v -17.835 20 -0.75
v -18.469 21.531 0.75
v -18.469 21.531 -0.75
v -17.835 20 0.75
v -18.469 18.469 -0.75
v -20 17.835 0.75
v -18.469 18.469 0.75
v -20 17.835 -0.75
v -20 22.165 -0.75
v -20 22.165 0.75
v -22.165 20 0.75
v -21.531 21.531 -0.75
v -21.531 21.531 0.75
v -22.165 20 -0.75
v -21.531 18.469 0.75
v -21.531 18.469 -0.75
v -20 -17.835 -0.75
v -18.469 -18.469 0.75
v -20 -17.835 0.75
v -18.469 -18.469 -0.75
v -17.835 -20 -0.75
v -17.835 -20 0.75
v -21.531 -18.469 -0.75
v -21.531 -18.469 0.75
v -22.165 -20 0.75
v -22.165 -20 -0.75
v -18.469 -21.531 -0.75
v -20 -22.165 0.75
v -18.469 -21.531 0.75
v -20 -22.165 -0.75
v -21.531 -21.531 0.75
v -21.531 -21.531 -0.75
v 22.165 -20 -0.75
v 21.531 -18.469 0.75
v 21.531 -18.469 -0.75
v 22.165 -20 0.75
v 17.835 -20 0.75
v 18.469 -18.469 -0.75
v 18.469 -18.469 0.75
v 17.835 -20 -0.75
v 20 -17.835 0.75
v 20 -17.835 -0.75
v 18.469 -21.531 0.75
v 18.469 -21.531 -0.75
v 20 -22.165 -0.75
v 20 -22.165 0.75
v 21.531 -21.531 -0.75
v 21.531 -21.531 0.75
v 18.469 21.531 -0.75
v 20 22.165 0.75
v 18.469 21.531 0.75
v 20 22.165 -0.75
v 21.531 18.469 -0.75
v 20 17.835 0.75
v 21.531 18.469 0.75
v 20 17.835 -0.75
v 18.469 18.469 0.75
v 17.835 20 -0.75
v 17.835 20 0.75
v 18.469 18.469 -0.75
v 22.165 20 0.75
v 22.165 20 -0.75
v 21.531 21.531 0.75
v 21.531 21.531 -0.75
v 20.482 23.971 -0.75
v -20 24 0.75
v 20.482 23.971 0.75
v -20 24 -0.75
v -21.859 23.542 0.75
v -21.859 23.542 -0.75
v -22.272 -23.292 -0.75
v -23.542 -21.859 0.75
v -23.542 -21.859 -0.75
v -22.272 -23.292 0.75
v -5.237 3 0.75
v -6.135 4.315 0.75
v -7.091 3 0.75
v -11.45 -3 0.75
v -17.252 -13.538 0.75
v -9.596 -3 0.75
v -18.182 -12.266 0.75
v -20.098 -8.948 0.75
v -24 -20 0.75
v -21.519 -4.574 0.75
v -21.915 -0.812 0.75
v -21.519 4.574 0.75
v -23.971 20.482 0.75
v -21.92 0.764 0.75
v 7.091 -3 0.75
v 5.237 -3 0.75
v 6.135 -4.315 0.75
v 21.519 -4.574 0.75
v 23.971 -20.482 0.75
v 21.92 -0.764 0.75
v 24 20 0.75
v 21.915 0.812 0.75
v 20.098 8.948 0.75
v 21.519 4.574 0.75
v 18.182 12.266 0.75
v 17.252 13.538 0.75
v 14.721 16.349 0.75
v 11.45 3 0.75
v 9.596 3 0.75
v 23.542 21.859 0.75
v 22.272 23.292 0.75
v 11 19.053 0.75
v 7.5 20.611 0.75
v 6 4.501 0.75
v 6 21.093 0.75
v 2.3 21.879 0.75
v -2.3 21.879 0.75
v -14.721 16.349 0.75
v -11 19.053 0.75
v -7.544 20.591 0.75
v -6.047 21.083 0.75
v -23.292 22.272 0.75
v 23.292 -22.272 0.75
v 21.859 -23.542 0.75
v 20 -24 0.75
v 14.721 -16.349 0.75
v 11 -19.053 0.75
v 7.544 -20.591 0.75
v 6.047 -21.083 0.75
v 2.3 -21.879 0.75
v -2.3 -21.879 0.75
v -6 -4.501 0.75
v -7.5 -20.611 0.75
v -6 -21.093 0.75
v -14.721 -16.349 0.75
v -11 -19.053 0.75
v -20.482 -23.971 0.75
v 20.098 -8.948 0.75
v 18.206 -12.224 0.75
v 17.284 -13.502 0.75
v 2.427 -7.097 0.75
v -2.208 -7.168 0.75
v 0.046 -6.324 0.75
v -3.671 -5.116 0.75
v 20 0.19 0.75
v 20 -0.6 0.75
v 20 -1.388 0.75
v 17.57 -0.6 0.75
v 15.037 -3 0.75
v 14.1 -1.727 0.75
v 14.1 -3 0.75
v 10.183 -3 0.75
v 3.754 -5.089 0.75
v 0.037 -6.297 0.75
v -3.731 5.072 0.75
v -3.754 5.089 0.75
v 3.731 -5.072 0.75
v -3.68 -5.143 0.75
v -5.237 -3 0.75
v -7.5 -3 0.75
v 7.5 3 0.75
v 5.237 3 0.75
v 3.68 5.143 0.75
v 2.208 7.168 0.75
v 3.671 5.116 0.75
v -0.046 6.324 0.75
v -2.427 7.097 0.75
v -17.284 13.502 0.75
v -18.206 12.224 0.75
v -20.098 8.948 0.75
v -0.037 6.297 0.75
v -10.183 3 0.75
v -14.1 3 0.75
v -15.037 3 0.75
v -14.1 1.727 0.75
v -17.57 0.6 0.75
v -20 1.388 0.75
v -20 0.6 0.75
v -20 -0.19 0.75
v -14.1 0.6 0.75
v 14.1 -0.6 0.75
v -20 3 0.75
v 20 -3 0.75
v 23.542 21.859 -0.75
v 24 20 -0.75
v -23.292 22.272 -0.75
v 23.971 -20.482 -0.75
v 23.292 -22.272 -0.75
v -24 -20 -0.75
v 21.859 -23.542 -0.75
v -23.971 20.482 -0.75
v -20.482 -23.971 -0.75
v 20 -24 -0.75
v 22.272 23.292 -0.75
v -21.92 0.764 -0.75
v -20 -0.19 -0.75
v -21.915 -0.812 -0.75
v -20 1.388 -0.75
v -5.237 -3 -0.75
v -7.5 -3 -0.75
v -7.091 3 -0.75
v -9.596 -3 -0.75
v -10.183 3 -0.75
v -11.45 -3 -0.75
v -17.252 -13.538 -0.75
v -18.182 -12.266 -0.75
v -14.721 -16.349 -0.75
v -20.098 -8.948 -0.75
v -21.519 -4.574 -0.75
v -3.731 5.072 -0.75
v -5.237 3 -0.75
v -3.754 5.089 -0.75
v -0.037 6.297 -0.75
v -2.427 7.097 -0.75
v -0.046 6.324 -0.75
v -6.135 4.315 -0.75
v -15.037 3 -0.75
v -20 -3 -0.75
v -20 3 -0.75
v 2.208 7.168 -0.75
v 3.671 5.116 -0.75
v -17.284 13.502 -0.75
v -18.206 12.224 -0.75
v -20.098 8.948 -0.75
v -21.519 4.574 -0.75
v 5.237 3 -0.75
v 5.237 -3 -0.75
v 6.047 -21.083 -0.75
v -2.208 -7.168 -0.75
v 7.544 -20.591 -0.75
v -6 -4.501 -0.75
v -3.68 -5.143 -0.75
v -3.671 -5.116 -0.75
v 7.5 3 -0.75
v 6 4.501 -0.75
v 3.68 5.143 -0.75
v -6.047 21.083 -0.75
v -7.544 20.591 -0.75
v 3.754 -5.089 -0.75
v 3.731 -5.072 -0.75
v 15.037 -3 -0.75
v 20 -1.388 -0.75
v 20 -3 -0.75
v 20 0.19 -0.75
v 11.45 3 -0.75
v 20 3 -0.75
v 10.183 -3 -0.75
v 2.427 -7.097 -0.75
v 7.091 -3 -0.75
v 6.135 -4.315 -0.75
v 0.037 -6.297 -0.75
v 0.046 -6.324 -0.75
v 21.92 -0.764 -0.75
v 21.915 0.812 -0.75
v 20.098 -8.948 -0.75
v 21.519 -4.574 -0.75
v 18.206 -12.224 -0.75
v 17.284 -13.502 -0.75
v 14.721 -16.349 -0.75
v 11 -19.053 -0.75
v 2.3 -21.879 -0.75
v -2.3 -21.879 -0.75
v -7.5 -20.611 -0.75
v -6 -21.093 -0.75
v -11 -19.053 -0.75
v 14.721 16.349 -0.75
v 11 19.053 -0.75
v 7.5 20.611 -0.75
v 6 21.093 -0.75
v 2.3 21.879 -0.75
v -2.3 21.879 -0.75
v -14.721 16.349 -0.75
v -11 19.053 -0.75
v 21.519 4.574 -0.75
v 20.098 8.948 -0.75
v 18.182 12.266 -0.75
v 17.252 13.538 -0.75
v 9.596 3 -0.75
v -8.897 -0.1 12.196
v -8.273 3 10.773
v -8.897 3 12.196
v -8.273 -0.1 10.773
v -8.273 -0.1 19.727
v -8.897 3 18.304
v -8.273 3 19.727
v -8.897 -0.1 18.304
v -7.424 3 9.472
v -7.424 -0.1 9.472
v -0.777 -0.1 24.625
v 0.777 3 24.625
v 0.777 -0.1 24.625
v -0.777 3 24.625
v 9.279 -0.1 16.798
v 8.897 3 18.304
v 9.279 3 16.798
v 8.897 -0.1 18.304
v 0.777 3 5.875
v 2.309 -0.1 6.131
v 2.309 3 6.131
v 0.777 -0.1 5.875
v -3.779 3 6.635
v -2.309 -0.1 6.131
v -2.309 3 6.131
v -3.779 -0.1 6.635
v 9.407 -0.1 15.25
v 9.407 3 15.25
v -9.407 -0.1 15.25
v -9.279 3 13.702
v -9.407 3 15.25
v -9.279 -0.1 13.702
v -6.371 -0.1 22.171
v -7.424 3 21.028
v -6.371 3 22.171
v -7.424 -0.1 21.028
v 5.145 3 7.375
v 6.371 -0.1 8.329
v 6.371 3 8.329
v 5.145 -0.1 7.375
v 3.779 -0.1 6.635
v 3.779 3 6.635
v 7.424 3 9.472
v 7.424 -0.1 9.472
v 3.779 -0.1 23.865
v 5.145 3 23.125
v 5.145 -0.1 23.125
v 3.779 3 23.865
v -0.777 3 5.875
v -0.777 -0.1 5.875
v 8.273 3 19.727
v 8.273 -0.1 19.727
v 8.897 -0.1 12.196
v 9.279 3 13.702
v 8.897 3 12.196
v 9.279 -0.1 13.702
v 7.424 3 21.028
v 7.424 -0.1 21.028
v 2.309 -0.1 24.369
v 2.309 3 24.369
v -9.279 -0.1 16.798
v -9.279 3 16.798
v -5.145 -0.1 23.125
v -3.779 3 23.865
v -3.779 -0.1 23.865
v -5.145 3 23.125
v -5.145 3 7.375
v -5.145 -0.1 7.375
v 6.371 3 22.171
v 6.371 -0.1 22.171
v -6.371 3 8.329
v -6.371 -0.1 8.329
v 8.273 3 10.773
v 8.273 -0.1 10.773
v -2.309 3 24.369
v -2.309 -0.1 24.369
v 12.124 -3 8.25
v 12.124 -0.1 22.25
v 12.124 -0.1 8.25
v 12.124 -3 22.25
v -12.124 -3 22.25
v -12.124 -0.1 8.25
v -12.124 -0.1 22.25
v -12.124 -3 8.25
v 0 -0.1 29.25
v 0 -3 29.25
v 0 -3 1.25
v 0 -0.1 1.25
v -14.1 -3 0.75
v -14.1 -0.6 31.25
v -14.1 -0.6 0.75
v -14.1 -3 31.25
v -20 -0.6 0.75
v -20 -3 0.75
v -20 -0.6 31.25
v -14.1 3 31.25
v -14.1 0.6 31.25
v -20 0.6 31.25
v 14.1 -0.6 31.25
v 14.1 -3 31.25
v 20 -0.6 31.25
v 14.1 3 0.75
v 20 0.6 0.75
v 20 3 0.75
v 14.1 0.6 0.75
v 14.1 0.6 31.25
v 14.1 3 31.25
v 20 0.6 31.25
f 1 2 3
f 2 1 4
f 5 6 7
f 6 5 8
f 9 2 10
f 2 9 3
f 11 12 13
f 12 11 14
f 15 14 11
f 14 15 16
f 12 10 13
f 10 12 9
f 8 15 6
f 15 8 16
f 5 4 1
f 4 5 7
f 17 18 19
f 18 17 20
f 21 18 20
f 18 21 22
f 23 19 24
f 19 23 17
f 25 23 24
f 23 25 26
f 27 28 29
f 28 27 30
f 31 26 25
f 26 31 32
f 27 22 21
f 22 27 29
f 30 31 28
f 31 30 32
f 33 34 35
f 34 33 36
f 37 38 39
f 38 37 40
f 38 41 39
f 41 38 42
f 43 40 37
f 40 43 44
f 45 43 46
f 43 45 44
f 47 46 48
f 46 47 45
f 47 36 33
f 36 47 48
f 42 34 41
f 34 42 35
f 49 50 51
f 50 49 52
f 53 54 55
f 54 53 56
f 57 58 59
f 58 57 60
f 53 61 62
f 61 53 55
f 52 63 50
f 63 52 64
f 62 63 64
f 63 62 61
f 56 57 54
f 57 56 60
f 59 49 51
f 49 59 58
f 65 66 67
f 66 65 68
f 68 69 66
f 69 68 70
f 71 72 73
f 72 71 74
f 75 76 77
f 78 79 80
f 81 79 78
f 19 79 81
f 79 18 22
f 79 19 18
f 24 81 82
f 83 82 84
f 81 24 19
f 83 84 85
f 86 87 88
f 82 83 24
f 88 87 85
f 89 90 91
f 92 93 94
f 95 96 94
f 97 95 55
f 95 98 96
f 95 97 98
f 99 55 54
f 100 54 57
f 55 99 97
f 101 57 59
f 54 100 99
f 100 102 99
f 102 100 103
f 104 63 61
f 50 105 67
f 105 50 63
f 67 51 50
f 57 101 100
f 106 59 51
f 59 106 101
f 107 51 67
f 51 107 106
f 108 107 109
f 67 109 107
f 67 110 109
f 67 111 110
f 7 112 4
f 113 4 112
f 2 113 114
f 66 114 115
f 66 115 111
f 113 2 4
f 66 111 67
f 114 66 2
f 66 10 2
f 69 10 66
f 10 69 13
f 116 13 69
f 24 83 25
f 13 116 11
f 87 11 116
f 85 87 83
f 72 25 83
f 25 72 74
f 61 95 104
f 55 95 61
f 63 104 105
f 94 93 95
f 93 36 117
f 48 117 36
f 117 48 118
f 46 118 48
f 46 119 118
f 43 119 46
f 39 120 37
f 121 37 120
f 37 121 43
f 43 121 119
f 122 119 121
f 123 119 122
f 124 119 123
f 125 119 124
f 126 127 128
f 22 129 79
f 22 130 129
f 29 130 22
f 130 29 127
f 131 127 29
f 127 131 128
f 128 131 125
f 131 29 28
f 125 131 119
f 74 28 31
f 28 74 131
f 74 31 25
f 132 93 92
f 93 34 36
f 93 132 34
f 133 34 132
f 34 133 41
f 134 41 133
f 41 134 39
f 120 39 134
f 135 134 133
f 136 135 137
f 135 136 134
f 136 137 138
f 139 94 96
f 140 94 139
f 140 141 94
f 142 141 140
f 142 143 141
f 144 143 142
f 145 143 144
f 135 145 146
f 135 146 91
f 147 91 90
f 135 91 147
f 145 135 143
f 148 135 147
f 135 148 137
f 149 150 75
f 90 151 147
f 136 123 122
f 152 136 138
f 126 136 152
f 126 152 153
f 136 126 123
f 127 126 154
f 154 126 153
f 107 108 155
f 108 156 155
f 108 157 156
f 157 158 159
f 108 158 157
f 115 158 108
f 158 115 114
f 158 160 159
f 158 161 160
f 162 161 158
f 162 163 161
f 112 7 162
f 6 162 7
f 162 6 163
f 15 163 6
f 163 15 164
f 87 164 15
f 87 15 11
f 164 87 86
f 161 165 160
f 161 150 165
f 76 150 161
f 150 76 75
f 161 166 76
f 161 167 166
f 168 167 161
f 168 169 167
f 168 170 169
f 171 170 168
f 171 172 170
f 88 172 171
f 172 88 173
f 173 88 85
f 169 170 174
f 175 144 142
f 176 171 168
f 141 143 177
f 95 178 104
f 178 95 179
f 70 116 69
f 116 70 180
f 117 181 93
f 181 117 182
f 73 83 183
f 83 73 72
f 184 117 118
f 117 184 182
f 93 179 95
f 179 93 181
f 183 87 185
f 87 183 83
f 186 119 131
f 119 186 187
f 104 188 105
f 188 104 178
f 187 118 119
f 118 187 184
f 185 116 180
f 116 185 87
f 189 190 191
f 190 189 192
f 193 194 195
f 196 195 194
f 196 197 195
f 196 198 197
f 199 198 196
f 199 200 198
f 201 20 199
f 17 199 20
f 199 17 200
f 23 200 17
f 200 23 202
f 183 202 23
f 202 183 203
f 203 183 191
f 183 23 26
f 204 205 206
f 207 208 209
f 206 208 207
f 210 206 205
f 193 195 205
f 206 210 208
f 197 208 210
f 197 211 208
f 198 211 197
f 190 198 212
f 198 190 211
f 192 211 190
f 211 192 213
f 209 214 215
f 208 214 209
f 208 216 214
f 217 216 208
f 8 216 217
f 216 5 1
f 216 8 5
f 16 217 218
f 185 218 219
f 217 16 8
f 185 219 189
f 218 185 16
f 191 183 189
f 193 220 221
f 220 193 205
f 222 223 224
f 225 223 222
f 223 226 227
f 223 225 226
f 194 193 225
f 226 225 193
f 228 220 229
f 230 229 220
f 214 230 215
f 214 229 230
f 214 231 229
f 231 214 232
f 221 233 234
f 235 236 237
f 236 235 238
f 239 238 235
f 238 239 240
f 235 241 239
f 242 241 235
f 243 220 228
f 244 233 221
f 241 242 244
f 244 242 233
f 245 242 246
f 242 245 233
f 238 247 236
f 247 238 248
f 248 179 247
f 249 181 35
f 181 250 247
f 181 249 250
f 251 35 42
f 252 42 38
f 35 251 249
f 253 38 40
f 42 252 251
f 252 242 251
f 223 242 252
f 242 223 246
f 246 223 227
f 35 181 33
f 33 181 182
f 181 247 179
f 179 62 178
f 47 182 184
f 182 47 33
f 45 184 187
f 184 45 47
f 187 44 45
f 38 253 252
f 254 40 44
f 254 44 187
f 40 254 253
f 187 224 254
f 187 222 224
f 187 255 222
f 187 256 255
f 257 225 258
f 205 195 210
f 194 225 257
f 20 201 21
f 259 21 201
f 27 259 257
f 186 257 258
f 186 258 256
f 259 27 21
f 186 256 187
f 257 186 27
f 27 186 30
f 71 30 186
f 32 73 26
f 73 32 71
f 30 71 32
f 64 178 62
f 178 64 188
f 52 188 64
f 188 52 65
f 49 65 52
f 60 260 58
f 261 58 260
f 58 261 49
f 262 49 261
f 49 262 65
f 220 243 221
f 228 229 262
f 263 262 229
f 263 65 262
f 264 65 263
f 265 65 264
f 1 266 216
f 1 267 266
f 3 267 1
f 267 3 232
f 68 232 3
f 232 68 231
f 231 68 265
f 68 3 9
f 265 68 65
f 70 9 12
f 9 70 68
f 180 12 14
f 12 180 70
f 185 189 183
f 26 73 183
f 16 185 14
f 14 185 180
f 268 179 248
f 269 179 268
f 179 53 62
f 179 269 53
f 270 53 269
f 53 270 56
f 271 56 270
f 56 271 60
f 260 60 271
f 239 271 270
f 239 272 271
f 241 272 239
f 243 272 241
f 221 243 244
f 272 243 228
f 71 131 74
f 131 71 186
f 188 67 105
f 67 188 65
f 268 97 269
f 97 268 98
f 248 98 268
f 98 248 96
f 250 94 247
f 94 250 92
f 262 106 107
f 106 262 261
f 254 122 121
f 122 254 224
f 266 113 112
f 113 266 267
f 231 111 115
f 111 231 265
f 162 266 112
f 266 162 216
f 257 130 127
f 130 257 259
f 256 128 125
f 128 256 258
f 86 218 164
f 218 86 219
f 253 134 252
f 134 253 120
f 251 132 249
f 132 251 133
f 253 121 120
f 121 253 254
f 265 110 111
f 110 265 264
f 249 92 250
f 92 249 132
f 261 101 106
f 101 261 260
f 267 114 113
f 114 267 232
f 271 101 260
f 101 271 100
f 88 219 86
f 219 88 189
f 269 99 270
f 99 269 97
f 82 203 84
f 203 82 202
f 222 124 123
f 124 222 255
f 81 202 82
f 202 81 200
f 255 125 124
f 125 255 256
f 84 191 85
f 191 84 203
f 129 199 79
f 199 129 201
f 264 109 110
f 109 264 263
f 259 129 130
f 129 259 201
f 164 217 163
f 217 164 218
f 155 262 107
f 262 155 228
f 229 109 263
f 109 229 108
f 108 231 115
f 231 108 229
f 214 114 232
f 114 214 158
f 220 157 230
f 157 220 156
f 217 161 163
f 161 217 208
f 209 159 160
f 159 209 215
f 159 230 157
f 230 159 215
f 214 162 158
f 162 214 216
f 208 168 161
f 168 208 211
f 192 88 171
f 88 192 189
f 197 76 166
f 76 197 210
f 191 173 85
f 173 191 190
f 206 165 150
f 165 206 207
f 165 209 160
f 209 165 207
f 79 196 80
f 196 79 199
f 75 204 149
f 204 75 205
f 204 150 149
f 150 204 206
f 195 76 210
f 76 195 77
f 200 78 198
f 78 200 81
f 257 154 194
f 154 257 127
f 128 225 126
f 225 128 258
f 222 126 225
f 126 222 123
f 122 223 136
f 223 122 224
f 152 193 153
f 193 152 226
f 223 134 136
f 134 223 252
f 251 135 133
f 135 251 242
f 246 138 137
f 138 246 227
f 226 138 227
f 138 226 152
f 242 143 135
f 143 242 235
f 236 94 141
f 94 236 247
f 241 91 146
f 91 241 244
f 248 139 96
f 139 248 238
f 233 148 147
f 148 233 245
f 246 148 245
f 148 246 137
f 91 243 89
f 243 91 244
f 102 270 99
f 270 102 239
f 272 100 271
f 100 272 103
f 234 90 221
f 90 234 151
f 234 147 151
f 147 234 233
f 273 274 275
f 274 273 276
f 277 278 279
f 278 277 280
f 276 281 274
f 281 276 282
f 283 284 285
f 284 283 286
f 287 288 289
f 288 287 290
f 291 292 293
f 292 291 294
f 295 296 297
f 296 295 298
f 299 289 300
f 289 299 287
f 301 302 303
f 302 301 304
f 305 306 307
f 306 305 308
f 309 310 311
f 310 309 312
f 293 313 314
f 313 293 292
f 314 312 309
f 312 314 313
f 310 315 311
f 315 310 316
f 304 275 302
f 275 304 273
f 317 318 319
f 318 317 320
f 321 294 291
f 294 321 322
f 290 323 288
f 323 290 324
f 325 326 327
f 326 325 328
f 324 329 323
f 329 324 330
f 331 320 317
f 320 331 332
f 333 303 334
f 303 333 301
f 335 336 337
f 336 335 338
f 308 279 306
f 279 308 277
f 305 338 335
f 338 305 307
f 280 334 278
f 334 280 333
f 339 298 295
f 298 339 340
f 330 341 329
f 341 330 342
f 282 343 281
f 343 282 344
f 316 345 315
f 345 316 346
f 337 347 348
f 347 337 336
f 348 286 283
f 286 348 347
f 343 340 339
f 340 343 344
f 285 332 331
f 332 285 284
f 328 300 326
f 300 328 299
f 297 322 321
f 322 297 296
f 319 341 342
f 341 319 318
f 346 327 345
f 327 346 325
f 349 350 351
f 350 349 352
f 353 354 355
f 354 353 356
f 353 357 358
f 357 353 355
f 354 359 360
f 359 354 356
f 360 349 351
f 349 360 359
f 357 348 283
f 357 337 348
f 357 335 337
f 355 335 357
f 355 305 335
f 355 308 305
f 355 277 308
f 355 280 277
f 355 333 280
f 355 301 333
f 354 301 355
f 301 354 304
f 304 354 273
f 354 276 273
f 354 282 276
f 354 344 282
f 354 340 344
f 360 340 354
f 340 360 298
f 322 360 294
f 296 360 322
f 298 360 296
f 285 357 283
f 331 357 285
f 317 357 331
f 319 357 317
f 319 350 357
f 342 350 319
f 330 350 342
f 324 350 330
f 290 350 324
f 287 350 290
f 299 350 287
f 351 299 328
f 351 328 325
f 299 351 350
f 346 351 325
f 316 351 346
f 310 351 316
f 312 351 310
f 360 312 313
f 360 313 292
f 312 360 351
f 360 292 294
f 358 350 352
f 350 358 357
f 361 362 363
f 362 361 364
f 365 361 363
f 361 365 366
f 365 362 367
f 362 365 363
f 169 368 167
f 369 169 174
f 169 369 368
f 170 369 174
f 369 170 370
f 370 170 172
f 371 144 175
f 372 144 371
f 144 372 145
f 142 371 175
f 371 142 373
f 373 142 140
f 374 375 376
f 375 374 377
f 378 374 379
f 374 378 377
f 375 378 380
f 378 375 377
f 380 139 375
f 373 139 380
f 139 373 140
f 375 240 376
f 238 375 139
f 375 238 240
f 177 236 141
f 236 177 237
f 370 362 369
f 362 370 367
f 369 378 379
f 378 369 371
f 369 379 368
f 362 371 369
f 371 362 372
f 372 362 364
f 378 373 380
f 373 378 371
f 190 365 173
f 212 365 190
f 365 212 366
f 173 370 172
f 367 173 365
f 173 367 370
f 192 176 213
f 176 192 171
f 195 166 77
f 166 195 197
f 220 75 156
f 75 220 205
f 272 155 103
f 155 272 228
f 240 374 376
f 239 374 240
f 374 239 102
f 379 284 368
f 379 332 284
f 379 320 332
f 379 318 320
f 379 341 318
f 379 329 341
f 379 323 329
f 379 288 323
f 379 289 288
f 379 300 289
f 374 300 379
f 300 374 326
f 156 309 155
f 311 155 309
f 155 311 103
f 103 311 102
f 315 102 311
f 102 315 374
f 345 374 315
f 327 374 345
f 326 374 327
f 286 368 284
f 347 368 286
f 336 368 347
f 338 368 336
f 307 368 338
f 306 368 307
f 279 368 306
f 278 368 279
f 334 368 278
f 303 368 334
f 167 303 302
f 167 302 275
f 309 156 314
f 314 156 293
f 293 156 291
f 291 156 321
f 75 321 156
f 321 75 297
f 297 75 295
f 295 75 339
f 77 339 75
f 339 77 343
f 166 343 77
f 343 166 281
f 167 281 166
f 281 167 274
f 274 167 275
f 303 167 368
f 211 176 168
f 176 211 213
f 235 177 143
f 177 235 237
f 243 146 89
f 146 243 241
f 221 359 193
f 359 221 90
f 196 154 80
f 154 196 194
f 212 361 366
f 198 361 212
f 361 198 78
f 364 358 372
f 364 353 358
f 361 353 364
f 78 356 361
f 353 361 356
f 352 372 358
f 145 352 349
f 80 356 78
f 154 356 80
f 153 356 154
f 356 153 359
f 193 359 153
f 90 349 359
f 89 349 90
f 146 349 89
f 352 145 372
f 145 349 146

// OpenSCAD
// file: config.scad
// modules
module_body_size = [25, 50, 10];
module_mount_edge_offset = 5;
module_level_bolt_size = 4;
module_level_spring_diameter = 8;
module_level_bolt_spacing = module_body_size[1] - 2*module_mount_edge_offset;
module_clamp_bolt_size = 4;
module_clamp_bolt_head_height = 3.5;

// main body
body_wall_thickness = 5;
body_size = [2*module_body_size[0]+2*body_wall_thickness+1, module_body_size[1]+2*body_wall_thickness+1, 55];
carriage_mount_hole_spacing=22.5;	// i3 rework standard
carriage_screw_size = 4;
carriage_screw_head_height = 2.5;
hotend_fan_output = 49;
hotend_fan_screw_spacing = 40;
hotend_fan_screw_size = 4;
blower_screw_spacing = 40;
blower_screw_size = 4;

// misc
body_chamfer = 2;
layer_height = 0.3;
tolerance = 0.1;
pf = 0.1;  // preview fix for z-buffer tearing on cuts
// main file
use <MCAD/polyholes.scad>
include <MCAD/nuts_and_bolts.scad>
include <config.scad>

thickness = 1.5;
flag_size = [1, 14, 10];
flag_y_offset_from_x_carriage = 12.5;
spines=10;
spine_offset=6;
spine_rotation=0;
size = blower_screw_spacing + blower_screw_size;

sensor_diameter = 18.75;
sensor_nut_height = 6;
sensor_ledge_width = 32;
sensor_ledge_thickness = 6;
sensor_ledge_length = 40;

exterior();
interior();
sensor_ledge();

module exterior()
{
	difference()
	{
		hull()
		{
			for(r=[1:4])
			{
				rotate([0, 0, r*90])
				{
					translate([blower_screw_spacing/2, blower_screw_spacing/2, 0])
					{
						cylinder(d=2*blower_screw_size, h=thickness, center=true);
					}
				}
			}
		}
		
		cylinder(d=size, h=thickness+pf, center=true);
		
		for(r=[1:4])
		{
			rotate([0, 0, r*90])
			{
				translate([blower_screw_spacing/2, blower_screw_spacing/2, 0])
				{
					translate([0, 0, -(body_wall_thickness+pf)/2])
					{
						polyhole(body_wall_thickness+pf, blower_screw_size);
					}
				}
			}
		}
	}
}

module interior()
{
	holeradius=size/2;

	translate([0, 0, -thickness/2])
	{
		for(i=[0:spines-1])
		{
			rotate(a=[0,0,i*(360.0/spines)+spine_rotation]) 
			{
				translate([spine_offset,-spine_offset/3.141,0])
				{
					cube([thickness,holeradius+(spine_offset/3.141),thickness]);
				}
			}
		}
	}
}

module sensor_ledge()
{
	translate([0, 0, sensor_ledge_width/2 - thickness/2])
	{
		difference()
		{
			cube([sensor_ledge_length, sensor_ledge_thickness, sensor_ledge_width], true);
			rotate([90, 0, 0])
			{
				sensor_cutout();
			}
			
			// cut edges down to the thickness of a optical endstop flag
			for(x=[-1:2:1])
			{
				for(y=[-1:2:1])
				{
					translate([x*(sensor_ledge_length/2 - 6/2 + pf), y*(3 - 1.25 + pf), thickness])
					{
						cube([6, 2.5, sensor_ledge_width], true);
					}
				}
			}
		}
	}
}

module sensor_cutout()
{
    cut_size = sensor_ledge_thickness + pf;
    translate([0, 0, -cut_size/2])
    {
        polyhole(cut_size, sensor_diameter);
    }
    
    nut_offset = sensor_ledge_thickness/2 + pf;
    translate([0, 0, nut_offset])
    {
        rotate([0, 0, 90])
        cylinder(h=sensor_nut_height, d=METRIC_NUT_AC_WIDTHS[16]+3*tolerance, $fn=6, center=true);
    }
}
